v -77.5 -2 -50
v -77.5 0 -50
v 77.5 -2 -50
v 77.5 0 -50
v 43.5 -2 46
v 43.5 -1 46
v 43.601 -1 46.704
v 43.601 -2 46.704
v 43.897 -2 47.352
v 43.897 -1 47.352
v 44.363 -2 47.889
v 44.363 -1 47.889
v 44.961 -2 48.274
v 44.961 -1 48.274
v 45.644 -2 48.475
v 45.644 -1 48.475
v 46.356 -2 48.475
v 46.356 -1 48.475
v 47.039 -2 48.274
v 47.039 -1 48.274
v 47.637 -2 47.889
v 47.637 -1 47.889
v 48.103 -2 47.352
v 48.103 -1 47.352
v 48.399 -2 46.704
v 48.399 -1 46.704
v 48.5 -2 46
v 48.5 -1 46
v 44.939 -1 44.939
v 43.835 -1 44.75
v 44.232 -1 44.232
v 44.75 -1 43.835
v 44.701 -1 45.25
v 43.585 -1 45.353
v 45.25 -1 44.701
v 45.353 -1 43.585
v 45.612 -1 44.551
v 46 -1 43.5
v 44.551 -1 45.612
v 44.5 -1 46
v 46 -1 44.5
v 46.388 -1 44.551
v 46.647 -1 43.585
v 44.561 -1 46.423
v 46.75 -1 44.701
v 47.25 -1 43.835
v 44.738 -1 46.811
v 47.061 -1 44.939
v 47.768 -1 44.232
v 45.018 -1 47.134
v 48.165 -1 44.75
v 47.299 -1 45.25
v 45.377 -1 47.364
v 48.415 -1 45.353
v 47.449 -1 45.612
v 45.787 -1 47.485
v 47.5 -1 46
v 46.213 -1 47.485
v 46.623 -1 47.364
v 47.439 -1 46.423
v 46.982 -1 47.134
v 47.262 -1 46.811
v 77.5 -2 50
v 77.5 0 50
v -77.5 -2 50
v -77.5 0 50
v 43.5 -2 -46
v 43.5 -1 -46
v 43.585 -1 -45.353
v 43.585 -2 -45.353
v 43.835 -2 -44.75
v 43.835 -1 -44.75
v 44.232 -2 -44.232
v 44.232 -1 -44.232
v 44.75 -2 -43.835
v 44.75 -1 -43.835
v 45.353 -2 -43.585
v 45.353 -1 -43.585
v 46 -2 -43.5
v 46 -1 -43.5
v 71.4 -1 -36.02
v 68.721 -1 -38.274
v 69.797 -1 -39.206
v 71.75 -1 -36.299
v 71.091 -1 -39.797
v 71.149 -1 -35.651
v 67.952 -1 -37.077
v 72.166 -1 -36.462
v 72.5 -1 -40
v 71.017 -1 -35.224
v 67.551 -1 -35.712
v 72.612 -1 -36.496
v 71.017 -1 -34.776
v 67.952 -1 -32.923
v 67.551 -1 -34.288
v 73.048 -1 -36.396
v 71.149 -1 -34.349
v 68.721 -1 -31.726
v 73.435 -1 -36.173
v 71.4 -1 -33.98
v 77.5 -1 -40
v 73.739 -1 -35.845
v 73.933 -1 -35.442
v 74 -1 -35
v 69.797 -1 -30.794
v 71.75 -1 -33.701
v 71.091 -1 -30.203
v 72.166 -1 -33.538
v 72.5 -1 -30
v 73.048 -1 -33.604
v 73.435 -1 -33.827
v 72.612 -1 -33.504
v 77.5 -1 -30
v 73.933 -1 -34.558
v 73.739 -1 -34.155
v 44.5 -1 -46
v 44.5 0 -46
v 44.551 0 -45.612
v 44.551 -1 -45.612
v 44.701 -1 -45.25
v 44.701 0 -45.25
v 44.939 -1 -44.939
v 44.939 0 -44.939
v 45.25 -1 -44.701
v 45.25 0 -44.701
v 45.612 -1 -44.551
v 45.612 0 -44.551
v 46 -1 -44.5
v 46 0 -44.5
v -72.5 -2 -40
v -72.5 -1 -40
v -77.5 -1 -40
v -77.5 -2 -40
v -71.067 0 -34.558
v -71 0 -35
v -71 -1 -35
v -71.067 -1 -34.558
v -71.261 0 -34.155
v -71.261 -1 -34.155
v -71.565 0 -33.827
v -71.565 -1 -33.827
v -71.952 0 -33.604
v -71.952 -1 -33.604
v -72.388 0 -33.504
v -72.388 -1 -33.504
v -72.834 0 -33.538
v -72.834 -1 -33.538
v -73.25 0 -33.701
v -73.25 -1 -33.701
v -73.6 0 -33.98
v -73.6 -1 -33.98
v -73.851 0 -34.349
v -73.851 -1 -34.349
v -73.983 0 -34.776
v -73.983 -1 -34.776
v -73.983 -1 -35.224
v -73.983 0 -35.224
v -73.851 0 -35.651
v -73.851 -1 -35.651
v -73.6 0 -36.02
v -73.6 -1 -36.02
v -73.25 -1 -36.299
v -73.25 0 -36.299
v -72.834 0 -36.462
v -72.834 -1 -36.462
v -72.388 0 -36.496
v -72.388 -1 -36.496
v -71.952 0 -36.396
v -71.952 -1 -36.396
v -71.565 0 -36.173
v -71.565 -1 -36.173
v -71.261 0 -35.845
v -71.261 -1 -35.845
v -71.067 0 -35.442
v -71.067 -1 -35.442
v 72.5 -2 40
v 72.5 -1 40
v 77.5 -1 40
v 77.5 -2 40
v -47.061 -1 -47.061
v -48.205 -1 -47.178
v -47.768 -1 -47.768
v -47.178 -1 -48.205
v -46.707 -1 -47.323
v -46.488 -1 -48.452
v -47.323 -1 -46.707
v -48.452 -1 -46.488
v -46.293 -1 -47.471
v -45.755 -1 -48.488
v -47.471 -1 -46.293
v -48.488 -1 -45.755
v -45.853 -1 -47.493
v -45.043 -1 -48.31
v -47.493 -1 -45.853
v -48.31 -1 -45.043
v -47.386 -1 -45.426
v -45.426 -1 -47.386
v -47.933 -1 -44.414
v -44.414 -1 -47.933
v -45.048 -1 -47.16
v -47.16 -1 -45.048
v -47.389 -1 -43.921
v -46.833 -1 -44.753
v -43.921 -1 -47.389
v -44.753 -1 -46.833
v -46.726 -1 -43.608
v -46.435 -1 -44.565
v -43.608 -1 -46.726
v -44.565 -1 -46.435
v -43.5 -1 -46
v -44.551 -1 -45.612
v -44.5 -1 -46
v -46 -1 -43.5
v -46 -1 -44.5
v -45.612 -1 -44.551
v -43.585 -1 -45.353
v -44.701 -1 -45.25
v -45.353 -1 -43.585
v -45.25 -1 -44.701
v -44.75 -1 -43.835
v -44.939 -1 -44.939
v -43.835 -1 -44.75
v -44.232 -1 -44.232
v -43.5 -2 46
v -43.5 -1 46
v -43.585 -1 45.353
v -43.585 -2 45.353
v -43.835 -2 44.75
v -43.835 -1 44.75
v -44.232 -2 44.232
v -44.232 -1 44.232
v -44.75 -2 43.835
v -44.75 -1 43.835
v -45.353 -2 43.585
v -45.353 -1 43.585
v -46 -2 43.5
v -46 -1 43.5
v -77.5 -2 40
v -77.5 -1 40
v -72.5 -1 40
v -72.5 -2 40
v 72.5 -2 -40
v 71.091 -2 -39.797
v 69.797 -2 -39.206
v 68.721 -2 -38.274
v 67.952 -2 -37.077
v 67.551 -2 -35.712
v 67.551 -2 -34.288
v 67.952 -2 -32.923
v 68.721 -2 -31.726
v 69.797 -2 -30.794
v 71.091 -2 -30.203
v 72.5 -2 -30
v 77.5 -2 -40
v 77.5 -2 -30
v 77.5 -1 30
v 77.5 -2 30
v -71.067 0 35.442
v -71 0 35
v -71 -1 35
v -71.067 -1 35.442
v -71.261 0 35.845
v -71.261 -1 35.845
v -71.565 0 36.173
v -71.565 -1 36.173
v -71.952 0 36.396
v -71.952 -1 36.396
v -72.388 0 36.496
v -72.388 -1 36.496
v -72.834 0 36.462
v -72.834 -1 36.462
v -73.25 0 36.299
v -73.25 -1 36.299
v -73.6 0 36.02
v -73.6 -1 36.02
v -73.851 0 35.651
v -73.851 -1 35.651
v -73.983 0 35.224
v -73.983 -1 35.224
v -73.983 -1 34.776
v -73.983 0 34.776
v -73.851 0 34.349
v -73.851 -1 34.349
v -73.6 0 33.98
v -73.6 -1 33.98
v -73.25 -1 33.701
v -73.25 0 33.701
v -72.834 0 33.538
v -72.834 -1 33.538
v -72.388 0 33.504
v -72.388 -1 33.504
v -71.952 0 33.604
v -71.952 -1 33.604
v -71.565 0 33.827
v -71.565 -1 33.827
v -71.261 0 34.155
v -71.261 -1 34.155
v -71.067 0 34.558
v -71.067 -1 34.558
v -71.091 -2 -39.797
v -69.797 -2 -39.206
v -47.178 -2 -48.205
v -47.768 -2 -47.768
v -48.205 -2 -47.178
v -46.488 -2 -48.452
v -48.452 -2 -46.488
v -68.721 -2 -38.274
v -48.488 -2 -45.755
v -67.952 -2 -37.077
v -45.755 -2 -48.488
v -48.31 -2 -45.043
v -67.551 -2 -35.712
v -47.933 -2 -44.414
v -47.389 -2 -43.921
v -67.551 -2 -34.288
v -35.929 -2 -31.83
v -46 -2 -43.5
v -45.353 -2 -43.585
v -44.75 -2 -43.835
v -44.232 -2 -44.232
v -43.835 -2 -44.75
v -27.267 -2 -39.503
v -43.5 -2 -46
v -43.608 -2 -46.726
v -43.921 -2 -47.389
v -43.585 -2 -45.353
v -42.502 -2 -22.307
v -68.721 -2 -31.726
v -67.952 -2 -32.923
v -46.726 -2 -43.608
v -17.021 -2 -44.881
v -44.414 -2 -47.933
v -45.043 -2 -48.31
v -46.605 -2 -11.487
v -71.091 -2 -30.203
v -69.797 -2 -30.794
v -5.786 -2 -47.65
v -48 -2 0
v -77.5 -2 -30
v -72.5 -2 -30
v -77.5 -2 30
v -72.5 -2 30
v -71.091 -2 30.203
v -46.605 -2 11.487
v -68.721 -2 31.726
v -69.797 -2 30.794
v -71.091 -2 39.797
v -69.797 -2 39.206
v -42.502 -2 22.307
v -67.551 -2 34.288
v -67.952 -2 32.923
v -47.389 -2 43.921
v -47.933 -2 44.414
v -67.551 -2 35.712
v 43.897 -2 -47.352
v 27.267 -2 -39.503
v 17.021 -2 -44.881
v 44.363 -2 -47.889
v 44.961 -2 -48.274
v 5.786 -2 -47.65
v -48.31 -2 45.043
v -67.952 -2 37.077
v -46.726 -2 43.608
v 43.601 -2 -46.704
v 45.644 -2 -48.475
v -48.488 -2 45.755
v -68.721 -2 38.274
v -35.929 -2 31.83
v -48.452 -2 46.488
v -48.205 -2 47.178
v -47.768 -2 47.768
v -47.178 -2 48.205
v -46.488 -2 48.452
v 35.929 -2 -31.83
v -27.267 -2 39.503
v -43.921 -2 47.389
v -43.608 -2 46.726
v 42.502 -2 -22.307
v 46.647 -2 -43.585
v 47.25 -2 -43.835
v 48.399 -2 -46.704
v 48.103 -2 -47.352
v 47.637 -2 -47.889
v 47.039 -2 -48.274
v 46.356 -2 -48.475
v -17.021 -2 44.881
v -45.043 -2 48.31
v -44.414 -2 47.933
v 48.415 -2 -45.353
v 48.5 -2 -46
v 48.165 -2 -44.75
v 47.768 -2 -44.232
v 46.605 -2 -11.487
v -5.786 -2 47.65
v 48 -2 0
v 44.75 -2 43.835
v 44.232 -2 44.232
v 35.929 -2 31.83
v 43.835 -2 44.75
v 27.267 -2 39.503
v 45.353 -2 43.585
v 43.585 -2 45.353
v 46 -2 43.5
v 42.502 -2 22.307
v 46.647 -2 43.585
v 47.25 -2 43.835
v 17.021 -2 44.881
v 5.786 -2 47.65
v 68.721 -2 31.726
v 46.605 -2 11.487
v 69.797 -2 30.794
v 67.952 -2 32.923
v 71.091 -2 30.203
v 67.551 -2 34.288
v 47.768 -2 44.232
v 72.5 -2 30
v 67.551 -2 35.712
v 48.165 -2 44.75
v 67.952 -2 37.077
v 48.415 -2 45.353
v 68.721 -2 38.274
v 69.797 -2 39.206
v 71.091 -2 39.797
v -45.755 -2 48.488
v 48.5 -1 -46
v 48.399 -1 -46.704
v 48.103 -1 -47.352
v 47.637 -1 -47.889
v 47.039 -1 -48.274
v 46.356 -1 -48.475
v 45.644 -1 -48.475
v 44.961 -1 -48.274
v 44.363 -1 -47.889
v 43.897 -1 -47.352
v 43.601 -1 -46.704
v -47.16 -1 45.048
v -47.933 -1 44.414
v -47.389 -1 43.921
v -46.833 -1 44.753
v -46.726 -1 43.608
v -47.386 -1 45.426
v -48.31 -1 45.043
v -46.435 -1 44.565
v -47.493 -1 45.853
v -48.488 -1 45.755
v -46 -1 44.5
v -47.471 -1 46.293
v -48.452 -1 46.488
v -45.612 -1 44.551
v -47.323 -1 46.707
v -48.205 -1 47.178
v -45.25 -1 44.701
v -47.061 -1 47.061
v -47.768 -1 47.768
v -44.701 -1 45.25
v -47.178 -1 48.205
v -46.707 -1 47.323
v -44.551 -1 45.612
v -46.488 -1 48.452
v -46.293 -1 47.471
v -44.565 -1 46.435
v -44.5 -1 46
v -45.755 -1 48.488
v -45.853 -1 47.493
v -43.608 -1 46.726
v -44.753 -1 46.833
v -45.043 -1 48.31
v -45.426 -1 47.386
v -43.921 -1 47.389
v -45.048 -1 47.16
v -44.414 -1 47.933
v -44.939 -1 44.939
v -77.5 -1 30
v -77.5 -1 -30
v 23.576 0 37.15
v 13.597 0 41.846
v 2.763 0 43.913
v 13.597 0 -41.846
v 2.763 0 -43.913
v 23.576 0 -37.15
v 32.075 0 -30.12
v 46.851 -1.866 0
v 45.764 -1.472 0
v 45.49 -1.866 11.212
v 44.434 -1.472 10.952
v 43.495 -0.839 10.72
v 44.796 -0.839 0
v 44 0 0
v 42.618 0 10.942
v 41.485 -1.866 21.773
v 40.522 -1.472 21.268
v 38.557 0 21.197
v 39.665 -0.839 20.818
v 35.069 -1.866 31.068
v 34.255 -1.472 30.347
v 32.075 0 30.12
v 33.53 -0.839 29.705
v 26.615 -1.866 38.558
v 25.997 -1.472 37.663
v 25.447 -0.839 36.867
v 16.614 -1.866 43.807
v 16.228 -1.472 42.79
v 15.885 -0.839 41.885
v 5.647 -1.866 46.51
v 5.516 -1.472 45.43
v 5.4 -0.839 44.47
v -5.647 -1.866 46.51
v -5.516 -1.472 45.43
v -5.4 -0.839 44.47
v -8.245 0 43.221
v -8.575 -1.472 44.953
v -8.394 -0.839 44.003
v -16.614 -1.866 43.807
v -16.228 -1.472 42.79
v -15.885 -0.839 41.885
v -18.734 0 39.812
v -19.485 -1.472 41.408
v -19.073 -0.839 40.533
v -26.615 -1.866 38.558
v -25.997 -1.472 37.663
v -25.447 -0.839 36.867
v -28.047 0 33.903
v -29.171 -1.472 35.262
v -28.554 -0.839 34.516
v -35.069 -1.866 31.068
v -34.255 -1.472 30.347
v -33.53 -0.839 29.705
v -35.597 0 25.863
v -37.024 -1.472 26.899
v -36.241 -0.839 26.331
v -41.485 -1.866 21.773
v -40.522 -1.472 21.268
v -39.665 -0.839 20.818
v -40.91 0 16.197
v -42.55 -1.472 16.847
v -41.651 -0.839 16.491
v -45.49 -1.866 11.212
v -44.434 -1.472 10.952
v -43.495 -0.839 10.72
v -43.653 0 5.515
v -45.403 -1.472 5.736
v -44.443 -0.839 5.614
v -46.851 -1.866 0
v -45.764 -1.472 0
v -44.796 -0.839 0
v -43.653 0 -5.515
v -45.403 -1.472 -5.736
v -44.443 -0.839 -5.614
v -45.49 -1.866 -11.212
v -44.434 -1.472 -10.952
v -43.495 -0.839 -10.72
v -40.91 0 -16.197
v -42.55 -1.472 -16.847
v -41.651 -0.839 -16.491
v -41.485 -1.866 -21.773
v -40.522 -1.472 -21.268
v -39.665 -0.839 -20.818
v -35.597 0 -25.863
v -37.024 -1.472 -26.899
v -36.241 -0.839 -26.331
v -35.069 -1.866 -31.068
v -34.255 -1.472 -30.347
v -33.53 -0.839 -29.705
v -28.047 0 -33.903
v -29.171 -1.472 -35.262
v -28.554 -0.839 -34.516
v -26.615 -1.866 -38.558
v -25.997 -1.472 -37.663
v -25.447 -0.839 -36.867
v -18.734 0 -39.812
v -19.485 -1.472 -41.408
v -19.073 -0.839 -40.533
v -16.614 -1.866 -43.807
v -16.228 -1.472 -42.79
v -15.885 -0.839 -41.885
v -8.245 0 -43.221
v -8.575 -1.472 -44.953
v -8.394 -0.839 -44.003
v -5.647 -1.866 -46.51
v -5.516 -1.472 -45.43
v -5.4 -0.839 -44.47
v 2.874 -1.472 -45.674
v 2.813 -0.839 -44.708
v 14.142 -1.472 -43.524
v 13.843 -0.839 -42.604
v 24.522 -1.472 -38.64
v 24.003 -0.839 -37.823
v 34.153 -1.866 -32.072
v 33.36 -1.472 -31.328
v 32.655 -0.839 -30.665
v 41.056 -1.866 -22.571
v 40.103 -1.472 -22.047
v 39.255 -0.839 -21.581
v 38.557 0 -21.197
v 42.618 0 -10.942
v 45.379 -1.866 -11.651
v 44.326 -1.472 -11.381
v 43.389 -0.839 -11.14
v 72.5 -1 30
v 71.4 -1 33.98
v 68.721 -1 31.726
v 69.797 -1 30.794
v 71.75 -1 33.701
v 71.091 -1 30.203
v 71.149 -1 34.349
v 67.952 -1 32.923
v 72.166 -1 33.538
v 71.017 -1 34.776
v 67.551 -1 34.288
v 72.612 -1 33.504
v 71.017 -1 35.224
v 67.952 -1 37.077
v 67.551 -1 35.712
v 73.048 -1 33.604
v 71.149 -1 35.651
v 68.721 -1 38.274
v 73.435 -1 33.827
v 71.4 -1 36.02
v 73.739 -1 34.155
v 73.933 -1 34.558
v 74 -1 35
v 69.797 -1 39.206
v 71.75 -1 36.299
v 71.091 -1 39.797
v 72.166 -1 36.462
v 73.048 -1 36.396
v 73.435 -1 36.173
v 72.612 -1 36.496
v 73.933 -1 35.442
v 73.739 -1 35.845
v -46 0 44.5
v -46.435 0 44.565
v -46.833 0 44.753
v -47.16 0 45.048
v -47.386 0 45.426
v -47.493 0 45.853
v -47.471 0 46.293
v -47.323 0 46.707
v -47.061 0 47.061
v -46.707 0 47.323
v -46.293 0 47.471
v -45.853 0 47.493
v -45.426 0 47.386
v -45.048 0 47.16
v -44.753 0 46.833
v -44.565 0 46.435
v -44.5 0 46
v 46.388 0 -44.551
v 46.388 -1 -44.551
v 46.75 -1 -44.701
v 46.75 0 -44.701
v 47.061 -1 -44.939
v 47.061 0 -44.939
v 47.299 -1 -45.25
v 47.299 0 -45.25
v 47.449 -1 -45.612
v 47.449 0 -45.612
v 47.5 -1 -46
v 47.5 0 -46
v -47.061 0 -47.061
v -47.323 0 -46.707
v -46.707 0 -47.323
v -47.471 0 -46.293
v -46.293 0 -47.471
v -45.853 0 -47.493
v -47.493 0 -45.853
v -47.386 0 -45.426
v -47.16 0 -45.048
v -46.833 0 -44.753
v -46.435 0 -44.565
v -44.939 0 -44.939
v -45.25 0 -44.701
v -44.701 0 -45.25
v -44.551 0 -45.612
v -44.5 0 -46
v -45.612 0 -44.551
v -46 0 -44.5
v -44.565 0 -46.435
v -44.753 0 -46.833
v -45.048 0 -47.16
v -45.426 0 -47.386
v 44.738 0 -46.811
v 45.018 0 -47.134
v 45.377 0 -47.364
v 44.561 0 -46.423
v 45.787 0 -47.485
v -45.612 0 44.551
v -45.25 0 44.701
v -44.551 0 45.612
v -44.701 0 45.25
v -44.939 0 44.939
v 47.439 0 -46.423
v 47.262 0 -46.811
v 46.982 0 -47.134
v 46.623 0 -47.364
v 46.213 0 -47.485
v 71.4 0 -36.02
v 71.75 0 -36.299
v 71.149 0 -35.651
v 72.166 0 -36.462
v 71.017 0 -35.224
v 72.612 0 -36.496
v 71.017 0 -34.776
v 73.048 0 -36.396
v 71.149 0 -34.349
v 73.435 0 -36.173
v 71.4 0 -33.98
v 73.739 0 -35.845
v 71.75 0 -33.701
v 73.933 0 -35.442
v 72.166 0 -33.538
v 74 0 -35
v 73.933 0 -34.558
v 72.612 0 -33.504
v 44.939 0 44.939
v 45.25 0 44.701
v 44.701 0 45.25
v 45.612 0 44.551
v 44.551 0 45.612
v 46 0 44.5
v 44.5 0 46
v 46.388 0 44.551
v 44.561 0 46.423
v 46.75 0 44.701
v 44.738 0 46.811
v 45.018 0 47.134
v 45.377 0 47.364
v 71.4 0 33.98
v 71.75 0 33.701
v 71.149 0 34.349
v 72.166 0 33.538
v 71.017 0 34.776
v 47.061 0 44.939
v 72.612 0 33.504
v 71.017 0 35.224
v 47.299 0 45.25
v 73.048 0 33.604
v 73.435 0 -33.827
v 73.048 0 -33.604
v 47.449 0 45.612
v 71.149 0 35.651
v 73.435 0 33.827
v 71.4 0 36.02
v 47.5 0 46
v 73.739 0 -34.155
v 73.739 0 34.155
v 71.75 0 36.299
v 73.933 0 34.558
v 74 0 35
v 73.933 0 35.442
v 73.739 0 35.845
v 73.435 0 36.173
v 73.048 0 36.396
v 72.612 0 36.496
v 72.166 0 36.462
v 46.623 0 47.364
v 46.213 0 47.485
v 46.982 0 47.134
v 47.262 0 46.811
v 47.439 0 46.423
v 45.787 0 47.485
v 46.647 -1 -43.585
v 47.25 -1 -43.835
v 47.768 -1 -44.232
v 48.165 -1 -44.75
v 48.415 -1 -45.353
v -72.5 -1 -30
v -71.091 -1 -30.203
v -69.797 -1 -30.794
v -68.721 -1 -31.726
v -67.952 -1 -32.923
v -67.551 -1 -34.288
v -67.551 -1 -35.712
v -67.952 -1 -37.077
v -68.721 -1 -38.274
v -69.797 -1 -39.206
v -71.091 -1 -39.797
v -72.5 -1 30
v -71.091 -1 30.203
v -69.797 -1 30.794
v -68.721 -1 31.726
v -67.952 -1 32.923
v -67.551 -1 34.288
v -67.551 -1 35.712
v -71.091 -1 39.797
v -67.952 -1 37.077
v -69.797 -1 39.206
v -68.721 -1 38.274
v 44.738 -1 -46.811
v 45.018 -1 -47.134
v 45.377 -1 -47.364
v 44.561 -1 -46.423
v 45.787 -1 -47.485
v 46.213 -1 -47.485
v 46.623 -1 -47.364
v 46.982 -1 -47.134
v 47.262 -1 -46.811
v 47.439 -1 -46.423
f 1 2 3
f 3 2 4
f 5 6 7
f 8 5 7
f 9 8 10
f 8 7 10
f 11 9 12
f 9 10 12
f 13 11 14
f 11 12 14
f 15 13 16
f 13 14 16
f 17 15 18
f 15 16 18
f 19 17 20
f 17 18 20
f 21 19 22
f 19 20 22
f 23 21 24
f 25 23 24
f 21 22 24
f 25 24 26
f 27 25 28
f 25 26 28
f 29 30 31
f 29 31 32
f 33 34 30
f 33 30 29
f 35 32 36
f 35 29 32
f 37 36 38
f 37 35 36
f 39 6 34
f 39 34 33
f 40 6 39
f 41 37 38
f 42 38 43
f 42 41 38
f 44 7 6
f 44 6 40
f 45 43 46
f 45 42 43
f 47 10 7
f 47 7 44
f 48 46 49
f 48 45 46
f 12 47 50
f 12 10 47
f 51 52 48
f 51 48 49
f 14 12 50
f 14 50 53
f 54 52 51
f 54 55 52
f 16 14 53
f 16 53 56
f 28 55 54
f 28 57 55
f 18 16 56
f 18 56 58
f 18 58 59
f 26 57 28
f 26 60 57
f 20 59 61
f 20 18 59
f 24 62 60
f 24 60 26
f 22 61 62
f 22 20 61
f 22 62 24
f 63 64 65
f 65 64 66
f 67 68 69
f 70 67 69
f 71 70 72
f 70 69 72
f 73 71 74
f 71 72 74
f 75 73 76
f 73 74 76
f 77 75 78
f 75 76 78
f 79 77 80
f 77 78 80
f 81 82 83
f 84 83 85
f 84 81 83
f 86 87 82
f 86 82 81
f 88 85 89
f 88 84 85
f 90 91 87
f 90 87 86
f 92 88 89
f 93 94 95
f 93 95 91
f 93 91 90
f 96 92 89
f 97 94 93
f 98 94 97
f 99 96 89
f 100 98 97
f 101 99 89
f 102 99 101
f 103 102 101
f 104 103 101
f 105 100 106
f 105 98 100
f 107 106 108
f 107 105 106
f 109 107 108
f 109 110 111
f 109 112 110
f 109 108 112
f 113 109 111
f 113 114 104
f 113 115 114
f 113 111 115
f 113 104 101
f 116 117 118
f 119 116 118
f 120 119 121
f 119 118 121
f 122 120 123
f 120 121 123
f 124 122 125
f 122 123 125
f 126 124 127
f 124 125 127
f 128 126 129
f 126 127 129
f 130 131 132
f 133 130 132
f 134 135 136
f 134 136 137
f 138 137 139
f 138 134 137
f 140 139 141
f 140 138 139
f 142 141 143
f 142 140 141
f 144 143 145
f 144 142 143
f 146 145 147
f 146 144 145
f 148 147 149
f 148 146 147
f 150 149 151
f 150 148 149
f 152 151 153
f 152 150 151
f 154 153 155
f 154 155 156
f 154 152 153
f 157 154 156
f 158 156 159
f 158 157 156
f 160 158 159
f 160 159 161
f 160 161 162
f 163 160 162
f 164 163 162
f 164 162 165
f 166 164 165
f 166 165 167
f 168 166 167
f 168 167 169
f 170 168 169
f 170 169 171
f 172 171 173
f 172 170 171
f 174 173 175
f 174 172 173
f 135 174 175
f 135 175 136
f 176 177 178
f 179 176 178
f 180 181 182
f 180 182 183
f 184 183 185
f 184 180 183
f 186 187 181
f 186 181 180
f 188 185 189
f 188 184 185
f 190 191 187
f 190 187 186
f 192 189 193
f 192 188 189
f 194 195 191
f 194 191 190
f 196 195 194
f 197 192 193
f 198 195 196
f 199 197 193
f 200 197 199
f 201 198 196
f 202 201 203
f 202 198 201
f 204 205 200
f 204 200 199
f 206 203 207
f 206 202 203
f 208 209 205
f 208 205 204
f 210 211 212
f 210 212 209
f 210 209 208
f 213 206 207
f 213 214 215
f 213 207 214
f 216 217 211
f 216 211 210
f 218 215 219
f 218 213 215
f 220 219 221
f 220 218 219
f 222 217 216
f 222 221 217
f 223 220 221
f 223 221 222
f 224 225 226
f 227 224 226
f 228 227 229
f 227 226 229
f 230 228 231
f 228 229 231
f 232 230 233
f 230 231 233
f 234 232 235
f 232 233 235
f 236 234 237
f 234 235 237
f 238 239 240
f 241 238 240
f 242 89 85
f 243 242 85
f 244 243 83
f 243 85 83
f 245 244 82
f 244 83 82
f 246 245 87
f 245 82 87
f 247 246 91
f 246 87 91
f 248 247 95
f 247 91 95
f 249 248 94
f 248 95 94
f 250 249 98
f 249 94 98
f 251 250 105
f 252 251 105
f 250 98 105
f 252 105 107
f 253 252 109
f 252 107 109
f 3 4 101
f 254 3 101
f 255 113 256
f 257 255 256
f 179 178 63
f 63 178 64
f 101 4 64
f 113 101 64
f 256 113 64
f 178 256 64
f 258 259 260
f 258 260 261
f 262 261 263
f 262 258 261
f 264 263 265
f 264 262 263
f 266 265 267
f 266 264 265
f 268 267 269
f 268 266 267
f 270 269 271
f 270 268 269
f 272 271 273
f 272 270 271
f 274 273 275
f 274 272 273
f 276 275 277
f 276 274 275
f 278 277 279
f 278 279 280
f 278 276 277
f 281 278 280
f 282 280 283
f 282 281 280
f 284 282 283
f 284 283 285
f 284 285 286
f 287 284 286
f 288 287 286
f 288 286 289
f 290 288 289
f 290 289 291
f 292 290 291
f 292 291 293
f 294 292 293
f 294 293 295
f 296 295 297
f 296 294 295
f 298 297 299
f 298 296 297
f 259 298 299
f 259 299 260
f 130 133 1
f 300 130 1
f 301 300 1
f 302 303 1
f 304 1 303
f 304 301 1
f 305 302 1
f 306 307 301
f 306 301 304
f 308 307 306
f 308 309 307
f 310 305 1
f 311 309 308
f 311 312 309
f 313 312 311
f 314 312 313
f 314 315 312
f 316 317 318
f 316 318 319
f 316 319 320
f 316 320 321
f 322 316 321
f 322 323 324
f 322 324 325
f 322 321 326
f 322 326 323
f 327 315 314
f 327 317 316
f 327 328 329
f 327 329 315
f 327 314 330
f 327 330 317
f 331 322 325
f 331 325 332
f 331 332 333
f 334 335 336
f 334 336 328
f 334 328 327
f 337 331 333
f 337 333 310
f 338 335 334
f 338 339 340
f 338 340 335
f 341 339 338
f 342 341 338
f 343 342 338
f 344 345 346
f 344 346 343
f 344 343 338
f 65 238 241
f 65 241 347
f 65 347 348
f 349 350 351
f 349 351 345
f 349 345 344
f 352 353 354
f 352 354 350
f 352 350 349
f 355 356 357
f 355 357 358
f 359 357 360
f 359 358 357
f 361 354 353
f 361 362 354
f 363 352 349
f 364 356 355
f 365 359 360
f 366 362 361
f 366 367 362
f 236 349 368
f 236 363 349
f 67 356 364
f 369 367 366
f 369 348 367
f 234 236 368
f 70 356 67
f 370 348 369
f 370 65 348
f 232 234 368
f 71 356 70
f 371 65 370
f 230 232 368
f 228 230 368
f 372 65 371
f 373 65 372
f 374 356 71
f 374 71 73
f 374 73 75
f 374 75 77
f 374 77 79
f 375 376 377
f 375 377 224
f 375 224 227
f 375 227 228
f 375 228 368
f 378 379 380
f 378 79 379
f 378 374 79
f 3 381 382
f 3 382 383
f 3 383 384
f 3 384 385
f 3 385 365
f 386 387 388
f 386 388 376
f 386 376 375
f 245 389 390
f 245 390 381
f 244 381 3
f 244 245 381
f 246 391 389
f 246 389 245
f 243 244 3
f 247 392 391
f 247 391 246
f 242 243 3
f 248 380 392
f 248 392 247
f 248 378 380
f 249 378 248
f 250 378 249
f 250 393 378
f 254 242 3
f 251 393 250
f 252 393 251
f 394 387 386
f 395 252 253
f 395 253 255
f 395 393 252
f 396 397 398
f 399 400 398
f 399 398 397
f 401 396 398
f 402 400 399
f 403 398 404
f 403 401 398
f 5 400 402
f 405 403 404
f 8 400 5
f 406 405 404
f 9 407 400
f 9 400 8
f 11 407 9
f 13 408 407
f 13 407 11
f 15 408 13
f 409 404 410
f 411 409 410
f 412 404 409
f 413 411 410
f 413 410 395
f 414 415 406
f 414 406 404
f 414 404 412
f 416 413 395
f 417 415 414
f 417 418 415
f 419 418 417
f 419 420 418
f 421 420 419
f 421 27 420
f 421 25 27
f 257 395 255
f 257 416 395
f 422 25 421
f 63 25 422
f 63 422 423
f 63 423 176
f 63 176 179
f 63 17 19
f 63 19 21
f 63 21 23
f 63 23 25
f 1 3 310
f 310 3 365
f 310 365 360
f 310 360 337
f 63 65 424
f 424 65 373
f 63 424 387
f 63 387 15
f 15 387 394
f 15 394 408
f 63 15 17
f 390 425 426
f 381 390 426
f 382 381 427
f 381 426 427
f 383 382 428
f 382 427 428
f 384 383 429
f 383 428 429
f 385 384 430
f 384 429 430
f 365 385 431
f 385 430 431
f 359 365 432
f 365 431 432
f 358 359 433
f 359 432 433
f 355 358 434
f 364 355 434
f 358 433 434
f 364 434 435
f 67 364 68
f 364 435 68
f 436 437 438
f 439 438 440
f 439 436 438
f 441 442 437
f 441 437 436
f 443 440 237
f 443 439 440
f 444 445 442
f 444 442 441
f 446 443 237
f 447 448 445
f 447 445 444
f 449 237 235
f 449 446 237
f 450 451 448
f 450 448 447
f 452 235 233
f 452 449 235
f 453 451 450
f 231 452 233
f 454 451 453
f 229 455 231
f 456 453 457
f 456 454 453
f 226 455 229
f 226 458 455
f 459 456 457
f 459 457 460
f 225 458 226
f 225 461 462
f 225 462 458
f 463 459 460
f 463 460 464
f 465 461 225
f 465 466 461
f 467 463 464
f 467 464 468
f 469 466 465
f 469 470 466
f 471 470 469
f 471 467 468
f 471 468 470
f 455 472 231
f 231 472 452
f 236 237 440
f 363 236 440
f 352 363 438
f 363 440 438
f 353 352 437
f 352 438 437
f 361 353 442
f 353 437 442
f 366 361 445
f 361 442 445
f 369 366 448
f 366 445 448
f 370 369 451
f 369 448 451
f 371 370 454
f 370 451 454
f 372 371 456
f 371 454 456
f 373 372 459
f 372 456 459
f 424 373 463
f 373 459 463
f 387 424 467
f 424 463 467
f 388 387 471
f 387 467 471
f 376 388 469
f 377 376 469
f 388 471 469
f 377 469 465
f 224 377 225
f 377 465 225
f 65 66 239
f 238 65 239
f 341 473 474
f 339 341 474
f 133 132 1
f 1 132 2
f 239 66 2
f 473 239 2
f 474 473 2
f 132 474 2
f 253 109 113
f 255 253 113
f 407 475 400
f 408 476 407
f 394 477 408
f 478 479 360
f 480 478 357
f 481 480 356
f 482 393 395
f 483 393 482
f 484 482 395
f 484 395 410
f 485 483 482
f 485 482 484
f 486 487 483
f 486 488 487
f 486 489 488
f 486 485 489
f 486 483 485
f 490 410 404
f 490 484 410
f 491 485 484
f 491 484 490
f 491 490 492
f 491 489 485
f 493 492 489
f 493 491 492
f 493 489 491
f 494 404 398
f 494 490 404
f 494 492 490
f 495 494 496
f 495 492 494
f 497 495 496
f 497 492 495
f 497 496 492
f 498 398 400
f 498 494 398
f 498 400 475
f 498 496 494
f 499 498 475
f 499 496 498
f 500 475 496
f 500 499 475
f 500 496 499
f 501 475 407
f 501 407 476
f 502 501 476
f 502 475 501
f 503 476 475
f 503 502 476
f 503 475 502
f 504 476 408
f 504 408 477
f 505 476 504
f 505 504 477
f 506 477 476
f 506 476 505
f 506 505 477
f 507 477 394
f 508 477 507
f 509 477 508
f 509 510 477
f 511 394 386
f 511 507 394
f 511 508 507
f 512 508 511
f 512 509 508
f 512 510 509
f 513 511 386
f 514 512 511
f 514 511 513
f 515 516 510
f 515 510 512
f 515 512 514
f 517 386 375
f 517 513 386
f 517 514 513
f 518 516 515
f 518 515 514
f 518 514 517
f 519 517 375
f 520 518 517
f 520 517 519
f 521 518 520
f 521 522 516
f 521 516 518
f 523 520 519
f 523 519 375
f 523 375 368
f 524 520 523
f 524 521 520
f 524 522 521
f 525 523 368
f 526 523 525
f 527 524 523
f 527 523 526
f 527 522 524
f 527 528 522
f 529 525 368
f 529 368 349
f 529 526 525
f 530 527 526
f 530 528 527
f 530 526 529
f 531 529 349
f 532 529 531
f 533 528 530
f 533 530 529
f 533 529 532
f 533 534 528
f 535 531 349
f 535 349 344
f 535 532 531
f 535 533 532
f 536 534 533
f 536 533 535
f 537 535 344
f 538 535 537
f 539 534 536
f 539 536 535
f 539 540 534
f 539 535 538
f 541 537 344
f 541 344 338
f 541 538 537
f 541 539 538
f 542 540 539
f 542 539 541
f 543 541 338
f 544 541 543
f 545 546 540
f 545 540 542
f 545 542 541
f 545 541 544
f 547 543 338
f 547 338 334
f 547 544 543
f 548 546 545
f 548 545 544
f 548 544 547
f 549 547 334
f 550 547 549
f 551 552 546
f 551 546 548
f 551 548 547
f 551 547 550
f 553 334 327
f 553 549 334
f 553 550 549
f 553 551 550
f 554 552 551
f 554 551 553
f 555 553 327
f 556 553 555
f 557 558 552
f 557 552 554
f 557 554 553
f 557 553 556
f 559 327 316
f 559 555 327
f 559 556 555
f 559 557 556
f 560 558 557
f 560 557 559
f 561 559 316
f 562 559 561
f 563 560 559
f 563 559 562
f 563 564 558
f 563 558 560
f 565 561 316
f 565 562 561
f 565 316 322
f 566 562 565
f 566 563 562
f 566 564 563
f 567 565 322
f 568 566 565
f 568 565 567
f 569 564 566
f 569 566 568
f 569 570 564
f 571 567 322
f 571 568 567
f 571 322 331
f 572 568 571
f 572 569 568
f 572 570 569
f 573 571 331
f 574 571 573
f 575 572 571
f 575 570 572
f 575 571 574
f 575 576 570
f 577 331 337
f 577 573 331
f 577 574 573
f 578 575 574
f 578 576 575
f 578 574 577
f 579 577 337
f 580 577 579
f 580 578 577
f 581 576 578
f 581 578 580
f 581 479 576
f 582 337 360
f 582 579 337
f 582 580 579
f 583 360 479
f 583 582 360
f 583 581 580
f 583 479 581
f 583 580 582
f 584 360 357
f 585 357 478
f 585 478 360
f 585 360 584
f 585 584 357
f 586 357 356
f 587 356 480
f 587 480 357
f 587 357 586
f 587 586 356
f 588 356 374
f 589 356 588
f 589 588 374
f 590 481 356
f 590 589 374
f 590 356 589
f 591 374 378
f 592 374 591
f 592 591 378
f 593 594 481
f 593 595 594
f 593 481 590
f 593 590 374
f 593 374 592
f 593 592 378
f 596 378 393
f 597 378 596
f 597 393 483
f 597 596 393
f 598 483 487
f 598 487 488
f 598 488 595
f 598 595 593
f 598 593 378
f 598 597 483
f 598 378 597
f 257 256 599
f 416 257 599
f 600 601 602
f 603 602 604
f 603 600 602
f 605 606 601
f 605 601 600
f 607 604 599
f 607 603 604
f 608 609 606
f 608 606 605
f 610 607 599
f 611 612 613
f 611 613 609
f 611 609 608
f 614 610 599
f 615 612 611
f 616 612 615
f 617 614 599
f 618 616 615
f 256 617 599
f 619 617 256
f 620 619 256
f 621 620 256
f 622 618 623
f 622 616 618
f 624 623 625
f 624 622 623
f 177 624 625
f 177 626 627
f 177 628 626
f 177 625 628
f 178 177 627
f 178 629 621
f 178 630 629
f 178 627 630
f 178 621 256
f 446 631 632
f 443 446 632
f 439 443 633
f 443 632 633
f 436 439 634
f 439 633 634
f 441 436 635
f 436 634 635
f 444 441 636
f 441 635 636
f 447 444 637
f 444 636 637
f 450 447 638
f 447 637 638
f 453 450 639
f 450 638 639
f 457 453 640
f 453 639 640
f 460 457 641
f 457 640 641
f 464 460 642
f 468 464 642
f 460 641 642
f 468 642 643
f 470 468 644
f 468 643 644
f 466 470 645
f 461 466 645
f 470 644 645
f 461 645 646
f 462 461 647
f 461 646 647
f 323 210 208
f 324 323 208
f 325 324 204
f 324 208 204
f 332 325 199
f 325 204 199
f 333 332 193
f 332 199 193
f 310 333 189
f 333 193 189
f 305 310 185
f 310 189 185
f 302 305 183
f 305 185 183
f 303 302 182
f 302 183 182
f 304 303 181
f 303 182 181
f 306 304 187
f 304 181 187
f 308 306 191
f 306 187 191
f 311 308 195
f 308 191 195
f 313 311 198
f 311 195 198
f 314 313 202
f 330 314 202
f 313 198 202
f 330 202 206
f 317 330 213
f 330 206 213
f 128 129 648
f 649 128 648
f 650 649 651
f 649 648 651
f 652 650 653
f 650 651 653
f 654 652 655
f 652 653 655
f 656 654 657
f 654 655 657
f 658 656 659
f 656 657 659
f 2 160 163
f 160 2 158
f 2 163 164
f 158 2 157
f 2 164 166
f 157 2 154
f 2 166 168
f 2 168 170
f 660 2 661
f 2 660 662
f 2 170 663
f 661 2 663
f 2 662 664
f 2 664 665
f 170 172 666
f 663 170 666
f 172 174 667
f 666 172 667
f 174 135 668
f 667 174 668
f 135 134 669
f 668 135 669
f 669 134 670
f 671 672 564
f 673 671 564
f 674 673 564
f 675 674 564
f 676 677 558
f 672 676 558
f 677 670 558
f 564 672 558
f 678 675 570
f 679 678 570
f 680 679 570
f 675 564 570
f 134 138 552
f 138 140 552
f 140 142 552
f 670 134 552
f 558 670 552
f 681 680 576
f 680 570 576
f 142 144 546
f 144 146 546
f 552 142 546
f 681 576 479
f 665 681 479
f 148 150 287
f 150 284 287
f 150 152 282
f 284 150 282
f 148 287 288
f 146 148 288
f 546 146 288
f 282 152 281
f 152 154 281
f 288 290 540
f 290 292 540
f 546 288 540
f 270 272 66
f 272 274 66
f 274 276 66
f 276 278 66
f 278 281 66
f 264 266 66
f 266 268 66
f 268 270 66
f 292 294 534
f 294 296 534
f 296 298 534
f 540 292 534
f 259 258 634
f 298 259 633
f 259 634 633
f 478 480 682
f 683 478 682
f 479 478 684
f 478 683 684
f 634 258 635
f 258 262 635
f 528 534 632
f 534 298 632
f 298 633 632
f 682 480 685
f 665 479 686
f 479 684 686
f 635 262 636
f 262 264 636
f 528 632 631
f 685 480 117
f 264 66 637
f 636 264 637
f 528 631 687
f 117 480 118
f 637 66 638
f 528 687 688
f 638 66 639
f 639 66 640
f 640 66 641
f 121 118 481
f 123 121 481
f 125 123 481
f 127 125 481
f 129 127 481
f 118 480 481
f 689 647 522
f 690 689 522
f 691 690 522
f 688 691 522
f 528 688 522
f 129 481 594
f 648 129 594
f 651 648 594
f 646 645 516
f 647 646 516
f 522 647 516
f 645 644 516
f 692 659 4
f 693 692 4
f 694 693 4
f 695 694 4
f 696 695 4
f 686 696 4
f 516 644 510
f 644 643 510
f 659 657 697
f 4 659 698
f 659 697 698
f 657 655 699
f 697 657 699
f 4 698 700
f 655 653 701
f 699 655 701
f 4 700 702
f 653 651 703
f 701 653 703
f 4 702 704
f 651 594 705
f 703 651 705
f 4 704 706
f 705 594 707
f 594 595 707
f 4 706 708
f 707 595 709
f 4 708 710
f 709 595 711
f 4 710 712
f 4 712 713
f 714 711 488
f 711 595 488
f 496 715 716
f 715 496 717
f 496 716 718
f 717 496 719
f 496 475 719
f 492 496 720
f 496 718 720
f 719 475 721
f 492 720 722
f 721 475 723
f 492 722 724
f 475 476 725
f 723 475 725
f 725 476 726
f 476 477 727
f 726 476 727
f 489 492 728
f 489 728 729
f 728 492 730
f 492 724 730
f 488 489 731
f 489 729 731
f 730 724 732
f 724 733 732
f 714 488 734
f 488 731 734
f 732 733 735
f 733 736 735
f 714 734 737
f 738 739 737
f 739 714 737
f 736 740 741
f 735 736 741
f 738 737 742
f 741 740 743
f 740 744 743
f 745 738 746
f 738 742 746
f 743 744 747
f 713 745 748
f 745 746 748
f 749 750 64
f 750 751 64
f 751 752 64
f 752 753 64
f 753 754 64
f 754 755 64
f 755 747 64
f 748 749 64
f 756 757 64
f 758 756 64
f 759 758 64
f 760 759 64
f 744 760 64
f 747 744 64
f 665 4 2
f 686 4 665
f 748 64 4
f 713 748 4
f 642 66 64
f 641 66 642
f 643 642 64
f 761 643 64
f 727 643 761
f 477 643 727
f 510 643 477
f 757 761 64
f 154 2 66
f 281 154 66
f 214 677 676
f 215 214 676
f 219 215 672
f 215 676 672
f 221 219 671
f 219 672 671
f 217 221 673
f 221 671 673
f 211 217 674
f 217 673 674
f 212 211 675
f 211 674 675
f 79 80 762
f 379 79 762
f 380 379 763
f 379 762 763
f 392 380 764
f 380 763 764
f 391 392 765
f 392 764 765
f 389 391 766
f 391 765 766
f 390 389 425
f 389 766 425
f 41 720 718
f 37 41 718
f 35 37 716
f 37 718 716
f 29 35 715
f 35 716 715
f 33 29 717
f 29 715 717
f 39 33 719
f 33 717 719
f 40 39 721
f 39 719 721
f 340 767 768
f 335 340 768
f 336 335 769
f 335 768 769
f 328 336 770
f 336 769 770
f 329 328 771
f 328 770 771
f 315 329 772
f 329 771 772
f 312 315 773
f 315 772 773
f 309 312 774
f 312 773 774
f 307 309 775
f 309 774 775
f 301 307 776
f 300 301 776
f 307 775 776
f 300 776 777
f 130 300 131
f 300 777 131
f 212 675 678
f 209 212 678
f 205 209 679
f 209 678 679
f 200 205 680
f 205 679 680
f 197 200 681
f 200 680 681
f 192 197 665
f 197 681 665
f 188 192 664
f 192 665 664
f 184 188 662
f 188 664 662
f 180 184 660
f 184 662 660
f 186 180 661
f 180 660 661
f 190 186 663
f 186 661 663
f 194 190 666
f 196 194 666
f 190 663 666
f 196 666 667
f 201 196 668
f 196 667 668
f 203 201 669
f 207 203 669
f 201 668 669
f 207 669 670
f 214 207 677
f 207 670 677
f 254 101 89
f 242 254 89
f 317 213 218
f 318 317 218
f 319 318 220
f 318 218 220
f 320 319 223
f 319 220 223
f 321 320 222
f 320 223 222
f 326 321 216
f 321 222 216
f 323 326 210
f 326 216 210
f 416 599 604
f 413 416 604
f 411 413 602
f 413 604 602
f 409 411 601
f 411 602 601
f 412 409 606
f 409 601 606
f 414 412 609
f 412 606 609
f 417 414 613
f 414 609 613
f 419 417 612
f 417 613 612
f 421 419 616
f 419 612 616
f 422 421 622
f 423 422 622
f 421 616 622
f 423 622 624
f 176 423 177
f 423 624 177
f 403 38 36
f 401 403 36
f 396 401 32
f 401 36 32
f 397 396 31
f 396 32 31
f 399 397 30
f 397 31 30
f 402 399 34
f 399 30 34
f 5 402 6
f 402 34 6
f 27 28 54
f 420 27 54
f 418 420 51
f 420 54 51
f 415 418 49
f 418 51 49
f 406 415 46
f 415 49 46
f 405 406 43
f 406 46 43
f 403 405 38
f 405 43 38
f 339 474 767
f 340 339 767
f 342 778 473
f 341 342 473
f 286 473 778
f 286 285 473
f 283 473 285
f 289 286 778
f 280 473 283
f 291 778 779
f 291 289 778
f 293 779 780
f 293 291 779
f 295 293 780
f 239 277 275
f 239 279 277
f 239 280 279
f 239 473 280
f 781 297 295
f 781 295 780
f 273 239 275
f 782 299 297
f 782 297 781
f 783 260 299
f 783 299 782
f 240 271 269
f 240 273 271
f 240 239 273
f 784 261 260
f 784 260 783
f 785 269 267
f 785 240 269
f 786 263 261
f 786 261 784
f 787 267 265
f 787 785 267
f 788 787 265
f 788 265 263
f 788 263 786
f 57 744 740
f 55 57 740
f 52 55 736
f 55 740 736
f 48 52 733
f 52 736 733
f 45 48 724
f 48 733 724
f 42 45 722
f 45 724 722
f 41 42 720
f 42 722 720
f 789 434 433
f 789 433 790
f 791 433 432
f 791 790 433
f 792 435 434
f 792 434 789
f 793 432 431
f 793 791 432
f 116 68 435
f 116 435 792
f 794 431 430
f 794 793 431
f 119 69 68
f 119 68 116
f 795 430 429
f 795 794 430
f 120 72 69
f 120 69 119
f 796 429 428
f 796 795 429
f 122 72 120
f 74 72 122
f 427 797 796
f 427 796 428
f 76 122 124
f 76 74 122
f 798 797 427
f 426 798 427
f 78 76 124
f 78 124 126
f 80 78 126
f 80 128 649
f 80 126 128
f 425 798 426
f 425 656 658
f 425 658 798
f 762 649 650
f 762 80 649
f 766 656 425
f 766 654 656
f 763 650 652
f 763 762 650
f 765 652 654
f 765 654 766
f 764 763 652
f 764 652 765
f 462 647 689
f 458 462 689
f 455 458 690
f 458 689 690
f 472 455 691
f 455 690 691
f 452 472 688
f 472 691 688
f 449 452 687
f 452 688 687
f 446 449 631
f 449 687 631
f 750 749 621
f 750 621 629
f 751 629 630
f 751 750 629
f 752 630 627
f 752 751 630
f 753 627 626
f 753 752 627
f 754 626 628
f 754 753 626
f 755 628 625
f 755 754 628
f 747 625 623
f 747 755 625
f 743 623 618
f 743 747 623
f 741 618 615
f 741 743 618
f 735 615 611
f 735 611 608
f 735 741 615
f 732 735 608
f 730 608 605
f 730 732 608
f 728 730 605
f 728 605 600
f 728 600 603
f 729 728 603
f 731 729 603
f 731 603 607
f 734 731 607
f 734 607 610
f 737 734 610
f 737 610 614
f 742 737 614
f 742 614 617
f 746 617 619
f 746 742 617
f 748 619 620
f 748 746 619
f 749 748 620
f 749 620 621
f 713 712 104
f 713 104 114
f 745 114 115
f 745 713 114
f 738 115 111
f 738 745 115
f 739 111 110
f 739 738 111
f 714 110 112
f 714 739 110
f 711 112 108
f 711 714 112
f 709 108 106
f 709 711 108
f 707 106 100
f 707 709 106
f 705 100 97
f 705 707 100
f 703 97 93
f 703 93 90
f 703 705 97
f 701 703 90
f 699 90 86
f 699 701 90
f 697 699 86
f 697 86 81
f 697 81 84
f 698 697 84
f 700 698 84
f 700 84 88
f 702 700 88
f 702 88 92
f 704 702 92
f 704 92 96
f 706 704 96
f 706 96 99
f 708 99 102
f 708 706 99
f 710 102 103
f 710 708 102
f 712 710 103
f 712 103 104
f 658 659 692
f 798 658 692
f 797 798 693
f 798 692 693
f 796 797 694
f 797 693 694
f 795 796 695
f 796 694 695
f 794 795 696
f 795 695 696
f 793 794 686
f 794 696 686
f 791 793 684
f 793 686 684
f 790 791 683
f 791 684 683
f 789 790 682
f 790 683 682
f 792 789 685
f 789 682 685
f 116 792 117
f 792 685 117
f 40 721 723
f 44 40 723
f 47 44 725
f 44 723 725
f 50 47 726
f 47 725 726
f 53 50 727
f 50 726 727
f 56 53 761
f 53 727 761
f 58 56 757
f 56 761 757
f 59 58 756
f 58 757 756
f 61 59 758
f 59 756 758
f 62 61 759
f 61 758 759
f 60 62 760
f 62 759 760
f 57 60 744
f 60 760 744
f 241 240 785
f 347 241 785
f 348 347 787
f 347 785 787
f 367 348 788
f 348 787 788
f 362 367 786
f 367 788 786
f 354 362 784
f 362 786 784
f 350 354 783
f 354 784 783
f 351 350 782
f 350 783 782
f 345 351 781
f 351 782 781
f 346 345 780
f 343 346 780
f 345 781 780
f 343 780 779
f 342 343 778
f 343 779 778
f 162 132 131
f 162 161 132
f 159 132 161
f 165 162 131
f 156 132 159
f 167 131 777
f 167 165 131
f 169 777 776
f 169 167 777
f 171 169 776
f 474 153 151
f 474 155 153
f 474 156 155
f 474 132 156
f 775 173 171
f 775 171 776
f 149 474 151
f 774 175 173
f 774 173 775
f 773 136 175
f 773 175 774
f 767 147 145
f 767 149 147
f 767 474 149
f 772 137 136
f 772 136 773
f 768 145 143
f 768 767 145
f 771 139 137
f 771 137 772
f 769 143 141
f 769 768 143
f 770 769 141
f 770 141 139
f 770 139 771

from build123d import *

# Parameters (mm, degrees)
F0_R     = 44
F1_DEPTH = 2
F0_R_2   = 1.5
F2_DEPTH = 1


# Not quite as in the source:
# - a fillet or chamfer that OpenCascade refuses, or shapes differently, is made with other operations: its cross-section is extruded or revolved along the edge and cut away or added


with BuildPart() as f1:
    # F0 (on Front) → F1 (new body)
    with BuildSketch(Plane.XZ):
        with BuildLine():
            Line((-77.5, -50), (77.5, -50))
            Line((77.5, -50), (77.5, -40))
            Line((77.5, -40), (72.5, -40))
            ThreePointArc((72.5, -40), (67.5, -35), (72.5, -30))
            Line((72.5, -30), (77.5, -30))
            Line((77.5, -30), (77.5, 30))
            Line((77.5, 30), (72.5, 30))
            ThreePointArc((72.5, 30), (67.5, 35), (72.5, 40))
            Line((72.5, 40), (77.5, 40))
            Line((77.5, 40), (77.5, 50))
            Line((77.5, 50), (-77.5, 50))
            Line((-77.5, 50), (-77.5, 40))
            Line((-77.5, 40), (-72.5, 40))
            ThreePointArc((-72.5, 40), (-67.5, 35), (-72.5, 30))
            Line((-72.5, 30), (-77.5, 30))
            Line((-77.5, 30), (-77.5, -30))
            Line((-77.5, -30), (-72.5, -30))
            ThreePointArc((-72.5, -30), (-67.5, -35), (-72.5, -40))
            Line((-72.5, -40), (-77.5, -40))
            Line((-77.5, -40), (-77.5, -50))
        make_face()
        with BuildLine():
            Line((43.5, -46), (-43.5, -46))
            ThreePointArc((-43.5, -46), (-47.767766953, -47.767766953), (-46, -43.5))
            Line((-46, -43.5), (-46, 43.5))
            ThreePointArc((-46, 43.5), (-47.767766953, 47.767766953), (-43.5, 46))
            Line((-43.5, 46), (43.5, 46))
            ThreePointArc((43.5, 46), (46, 48.5), (48.5, 46))
            ThreePointArc((48.5, 46), (47.767766953, 44.232233047), (46, 43.5))
            Line((46, 43.5), (46, -43.5))
            ThreePointArc((46, -43.5), (47.767766953, -44.232233047), (48.5, -46))
            ThreePointArc((48.5, -46), (46, -48.5), (43.5, -46))
        make_face(mode=Mode.SUBTRACT)
        with BuildLine():
            ThreePointArc((-46, -43.5), (-44.232233047, -44.232233047), (-43.5, -46))
            Line((-43.5, -46), (43.5, -46))
            ThreePointArc((43.5, -46), (44.232233047, -44.232233047), (46, -43.5))
            Line((46, -43.5), (46, 43.5))
            ThreePointArc((46, 43.5), (44.232233047, 44.232233047), (43.5, 46))
            Line((43.5, 46), (-43.5, 46))
            ThreePointArc((-43.5, 46), (-44.232233047, 44.232233047), (-46, 43.5))
            Line((-46, 43.5), (-46, -43.5))
        make_face()
        Circle(F0_R, mode=Mode.SUBTRACT)
    extrude(amount=F1_DEPTH)

    # F0 (on Front) → F2 (join)
    with BuildSketch(Plane.XZ):
        with BuildLine():
            Line((-77.5, -30), (-77.5, -40))
            Line((-77.5, -40), (-72.5, -40))
            ThreePointArc((-72.5, -40), (-67.5, -35), (-72.5, -30))
            Line((-72.5, -30), (-77.5, -30))
        make_face()
        with Locations((-72.5, -35)):
            Circle(F0_R_2, mode=Mode.SUBTRACT)
        with BuildLine():
            Line((-77.5, 40), (-77.5, 30))
            Line((-77.5, 30), (-72.5, 30))
            ThreePointArc((-72.5, 30), (-67.5, 35), (-72.5, 40))
            Line((-72.5, 40), (-77.5, 40))
        make_face()
        with Locations((-72.5, 35)):
            Circle(F0_R_2, mode=Mode.SUBTRACT)
        with BuildLine():
            Line((72.5, 30), (77.5, 30))
            Line((77.5, 30), (77.5, 40))
            Line((77.5, 40), (72.5, 40))
            ThreePointArc((72.5, 40), (67.5, 35), (72.5, 30))
        make_face()
        with Locations((72.5, 35)):
            Circle(F0_R_2, mode=Mode.SUBTRACT)
        with BuildLine():
            Line((72.5, -40), (77.5, -40))
            Line((77.5, -40), (77.5, -30))
            Line((77.5, -30), (72.5, -30))
            ThreePointArc((72.5, -30), (67.5, -35), (72.5, -40))
        make_face()
        with Locations((72.5, -35)):
            Circle(F0_R_2, mode=Mode.SUBTRACT)
        with BuildLine():
            ThreePointArc((-43.5, 46), (-47.767766953, 47.767766953), (-46, 43.5))
            Line((-46, 43.5), (-46, 44.5))
            ThreePointArc((-46, 44.5), (-47.0606601718, 47.0606601718), (-44.5, 46))
            Line((-44.5, 46), (-43.5, 46))
        make_face()
        with BuildLine():
            Line((-46, 44.5), (-46, 43.5))
            ThreePointArc((-46, 43.5), (-44.232233047, 44.232233047), (-43.5, 46))
            Line((-43.5, 46), (-44.5, 46))
            ThreePointArc((-44.5, 46), (-44.9393398282, 44.9393398282), (-46, 44.5))
        make_face()
        with BuildLine():
            Line((46, 44.5), (46, 43.5))
            ThreePointArc((46, 43.5), (47.767766953, 44.232233047), (48.5, 46))
            ThreePointArc((48.5, 46), (46, 48.5), (43.5, 46))
            Line((43.5, 46), (44.5, 46))
            ThreePointArc((44.5, 46), (46, 47.5), (47.5, 46))
            ThreePointArc((47.5, 46), (47.0606601718, 44.9393398282), (46, 44.5))
        make_face()
        with BuildLine():
            ThreePointArc((43.5, 46), (44.232233047, 44.232233047), (46, 43.5))
            Line((46, 43.5), (46, 44.5))
            ThreePointArc((46, 44.5), (44.9393398282, 44.9393398282), (44.5, 46))
            Line((44.5, 46), (43.5, 46))
        make_face()
        with BuildLine():
            Line((44.5, -46), (43.5, -46))
            ThreePointArc((43.5, -46), (46, -48.5), (48.5, -46))
            ThreePointArc((48.5, -46), (47.767766953, -44.232233047), (46, -43.5))
            Line((46, -43.5), (46, -44.5))
            ThreePointArc((46, -44.5), (47.0606601718, -44.9393398282), (47.5, -46))
            ThreePointArc((47.5, -46), (46, -47.5), (44.5, -46))
        make_face()
        with BuildLine():
            ThreePointArc((46, -43.5), (44.232233047, -44.232233047), (43.5, -46))
            Line((43.5, -46), (44.5, -46))
            ThreePointArc((44.5, -46), (44.9393398282, -44.9393398282), (46, -44.5))
            Line((46, -44.5), (46, -43.5))
        make_face()
        with BuildLine():
            Line((-44.5, -46), (-43.5, -46))
            ThreePointArc((-43.5, -46), (-44.232233047, -44.232233047), (-46, -43.5))
            Line((-46, -43.5), (-46, -44.5))
            ThreePointArc((-46, -44.5), (-44.9393398282, -44.9393398282), (-44.5, -46))
        make_face()
        with BuildLine():
            ThreePointArc((-46, -43.5), (-47.767766953, -47.767766953), (-43.5, -46))
            Line((-43.5, -46), (-44.5, -46))
            ThreePointArc((-44.5, -46), (-47.0606601718, -47.0606601718), (-46, -44.5))
            Line((-46, -44.5), (-46, -43.5))
        make_face()
    extrude(amount=F2_DEPTH)

    # F3: fillet of radius 5 on 1 edges, made by hand

    # F3_s1 → F3_t2 (revolve, cut)
    with BuildSketch(Plane.XY):
        with BuildLine():
            ThreePointArc((48, -2), (45.7639320225, -1.472135955), (44, 0))
            Line((44, 0), (44, -2))
            Line((44, -2), (48, -2))
        make_face()
    revolve(axis=Axis((0, -2, 0), (0, -1, 0)), mode=Mode.SUBTRACT)


solid = f1.part
